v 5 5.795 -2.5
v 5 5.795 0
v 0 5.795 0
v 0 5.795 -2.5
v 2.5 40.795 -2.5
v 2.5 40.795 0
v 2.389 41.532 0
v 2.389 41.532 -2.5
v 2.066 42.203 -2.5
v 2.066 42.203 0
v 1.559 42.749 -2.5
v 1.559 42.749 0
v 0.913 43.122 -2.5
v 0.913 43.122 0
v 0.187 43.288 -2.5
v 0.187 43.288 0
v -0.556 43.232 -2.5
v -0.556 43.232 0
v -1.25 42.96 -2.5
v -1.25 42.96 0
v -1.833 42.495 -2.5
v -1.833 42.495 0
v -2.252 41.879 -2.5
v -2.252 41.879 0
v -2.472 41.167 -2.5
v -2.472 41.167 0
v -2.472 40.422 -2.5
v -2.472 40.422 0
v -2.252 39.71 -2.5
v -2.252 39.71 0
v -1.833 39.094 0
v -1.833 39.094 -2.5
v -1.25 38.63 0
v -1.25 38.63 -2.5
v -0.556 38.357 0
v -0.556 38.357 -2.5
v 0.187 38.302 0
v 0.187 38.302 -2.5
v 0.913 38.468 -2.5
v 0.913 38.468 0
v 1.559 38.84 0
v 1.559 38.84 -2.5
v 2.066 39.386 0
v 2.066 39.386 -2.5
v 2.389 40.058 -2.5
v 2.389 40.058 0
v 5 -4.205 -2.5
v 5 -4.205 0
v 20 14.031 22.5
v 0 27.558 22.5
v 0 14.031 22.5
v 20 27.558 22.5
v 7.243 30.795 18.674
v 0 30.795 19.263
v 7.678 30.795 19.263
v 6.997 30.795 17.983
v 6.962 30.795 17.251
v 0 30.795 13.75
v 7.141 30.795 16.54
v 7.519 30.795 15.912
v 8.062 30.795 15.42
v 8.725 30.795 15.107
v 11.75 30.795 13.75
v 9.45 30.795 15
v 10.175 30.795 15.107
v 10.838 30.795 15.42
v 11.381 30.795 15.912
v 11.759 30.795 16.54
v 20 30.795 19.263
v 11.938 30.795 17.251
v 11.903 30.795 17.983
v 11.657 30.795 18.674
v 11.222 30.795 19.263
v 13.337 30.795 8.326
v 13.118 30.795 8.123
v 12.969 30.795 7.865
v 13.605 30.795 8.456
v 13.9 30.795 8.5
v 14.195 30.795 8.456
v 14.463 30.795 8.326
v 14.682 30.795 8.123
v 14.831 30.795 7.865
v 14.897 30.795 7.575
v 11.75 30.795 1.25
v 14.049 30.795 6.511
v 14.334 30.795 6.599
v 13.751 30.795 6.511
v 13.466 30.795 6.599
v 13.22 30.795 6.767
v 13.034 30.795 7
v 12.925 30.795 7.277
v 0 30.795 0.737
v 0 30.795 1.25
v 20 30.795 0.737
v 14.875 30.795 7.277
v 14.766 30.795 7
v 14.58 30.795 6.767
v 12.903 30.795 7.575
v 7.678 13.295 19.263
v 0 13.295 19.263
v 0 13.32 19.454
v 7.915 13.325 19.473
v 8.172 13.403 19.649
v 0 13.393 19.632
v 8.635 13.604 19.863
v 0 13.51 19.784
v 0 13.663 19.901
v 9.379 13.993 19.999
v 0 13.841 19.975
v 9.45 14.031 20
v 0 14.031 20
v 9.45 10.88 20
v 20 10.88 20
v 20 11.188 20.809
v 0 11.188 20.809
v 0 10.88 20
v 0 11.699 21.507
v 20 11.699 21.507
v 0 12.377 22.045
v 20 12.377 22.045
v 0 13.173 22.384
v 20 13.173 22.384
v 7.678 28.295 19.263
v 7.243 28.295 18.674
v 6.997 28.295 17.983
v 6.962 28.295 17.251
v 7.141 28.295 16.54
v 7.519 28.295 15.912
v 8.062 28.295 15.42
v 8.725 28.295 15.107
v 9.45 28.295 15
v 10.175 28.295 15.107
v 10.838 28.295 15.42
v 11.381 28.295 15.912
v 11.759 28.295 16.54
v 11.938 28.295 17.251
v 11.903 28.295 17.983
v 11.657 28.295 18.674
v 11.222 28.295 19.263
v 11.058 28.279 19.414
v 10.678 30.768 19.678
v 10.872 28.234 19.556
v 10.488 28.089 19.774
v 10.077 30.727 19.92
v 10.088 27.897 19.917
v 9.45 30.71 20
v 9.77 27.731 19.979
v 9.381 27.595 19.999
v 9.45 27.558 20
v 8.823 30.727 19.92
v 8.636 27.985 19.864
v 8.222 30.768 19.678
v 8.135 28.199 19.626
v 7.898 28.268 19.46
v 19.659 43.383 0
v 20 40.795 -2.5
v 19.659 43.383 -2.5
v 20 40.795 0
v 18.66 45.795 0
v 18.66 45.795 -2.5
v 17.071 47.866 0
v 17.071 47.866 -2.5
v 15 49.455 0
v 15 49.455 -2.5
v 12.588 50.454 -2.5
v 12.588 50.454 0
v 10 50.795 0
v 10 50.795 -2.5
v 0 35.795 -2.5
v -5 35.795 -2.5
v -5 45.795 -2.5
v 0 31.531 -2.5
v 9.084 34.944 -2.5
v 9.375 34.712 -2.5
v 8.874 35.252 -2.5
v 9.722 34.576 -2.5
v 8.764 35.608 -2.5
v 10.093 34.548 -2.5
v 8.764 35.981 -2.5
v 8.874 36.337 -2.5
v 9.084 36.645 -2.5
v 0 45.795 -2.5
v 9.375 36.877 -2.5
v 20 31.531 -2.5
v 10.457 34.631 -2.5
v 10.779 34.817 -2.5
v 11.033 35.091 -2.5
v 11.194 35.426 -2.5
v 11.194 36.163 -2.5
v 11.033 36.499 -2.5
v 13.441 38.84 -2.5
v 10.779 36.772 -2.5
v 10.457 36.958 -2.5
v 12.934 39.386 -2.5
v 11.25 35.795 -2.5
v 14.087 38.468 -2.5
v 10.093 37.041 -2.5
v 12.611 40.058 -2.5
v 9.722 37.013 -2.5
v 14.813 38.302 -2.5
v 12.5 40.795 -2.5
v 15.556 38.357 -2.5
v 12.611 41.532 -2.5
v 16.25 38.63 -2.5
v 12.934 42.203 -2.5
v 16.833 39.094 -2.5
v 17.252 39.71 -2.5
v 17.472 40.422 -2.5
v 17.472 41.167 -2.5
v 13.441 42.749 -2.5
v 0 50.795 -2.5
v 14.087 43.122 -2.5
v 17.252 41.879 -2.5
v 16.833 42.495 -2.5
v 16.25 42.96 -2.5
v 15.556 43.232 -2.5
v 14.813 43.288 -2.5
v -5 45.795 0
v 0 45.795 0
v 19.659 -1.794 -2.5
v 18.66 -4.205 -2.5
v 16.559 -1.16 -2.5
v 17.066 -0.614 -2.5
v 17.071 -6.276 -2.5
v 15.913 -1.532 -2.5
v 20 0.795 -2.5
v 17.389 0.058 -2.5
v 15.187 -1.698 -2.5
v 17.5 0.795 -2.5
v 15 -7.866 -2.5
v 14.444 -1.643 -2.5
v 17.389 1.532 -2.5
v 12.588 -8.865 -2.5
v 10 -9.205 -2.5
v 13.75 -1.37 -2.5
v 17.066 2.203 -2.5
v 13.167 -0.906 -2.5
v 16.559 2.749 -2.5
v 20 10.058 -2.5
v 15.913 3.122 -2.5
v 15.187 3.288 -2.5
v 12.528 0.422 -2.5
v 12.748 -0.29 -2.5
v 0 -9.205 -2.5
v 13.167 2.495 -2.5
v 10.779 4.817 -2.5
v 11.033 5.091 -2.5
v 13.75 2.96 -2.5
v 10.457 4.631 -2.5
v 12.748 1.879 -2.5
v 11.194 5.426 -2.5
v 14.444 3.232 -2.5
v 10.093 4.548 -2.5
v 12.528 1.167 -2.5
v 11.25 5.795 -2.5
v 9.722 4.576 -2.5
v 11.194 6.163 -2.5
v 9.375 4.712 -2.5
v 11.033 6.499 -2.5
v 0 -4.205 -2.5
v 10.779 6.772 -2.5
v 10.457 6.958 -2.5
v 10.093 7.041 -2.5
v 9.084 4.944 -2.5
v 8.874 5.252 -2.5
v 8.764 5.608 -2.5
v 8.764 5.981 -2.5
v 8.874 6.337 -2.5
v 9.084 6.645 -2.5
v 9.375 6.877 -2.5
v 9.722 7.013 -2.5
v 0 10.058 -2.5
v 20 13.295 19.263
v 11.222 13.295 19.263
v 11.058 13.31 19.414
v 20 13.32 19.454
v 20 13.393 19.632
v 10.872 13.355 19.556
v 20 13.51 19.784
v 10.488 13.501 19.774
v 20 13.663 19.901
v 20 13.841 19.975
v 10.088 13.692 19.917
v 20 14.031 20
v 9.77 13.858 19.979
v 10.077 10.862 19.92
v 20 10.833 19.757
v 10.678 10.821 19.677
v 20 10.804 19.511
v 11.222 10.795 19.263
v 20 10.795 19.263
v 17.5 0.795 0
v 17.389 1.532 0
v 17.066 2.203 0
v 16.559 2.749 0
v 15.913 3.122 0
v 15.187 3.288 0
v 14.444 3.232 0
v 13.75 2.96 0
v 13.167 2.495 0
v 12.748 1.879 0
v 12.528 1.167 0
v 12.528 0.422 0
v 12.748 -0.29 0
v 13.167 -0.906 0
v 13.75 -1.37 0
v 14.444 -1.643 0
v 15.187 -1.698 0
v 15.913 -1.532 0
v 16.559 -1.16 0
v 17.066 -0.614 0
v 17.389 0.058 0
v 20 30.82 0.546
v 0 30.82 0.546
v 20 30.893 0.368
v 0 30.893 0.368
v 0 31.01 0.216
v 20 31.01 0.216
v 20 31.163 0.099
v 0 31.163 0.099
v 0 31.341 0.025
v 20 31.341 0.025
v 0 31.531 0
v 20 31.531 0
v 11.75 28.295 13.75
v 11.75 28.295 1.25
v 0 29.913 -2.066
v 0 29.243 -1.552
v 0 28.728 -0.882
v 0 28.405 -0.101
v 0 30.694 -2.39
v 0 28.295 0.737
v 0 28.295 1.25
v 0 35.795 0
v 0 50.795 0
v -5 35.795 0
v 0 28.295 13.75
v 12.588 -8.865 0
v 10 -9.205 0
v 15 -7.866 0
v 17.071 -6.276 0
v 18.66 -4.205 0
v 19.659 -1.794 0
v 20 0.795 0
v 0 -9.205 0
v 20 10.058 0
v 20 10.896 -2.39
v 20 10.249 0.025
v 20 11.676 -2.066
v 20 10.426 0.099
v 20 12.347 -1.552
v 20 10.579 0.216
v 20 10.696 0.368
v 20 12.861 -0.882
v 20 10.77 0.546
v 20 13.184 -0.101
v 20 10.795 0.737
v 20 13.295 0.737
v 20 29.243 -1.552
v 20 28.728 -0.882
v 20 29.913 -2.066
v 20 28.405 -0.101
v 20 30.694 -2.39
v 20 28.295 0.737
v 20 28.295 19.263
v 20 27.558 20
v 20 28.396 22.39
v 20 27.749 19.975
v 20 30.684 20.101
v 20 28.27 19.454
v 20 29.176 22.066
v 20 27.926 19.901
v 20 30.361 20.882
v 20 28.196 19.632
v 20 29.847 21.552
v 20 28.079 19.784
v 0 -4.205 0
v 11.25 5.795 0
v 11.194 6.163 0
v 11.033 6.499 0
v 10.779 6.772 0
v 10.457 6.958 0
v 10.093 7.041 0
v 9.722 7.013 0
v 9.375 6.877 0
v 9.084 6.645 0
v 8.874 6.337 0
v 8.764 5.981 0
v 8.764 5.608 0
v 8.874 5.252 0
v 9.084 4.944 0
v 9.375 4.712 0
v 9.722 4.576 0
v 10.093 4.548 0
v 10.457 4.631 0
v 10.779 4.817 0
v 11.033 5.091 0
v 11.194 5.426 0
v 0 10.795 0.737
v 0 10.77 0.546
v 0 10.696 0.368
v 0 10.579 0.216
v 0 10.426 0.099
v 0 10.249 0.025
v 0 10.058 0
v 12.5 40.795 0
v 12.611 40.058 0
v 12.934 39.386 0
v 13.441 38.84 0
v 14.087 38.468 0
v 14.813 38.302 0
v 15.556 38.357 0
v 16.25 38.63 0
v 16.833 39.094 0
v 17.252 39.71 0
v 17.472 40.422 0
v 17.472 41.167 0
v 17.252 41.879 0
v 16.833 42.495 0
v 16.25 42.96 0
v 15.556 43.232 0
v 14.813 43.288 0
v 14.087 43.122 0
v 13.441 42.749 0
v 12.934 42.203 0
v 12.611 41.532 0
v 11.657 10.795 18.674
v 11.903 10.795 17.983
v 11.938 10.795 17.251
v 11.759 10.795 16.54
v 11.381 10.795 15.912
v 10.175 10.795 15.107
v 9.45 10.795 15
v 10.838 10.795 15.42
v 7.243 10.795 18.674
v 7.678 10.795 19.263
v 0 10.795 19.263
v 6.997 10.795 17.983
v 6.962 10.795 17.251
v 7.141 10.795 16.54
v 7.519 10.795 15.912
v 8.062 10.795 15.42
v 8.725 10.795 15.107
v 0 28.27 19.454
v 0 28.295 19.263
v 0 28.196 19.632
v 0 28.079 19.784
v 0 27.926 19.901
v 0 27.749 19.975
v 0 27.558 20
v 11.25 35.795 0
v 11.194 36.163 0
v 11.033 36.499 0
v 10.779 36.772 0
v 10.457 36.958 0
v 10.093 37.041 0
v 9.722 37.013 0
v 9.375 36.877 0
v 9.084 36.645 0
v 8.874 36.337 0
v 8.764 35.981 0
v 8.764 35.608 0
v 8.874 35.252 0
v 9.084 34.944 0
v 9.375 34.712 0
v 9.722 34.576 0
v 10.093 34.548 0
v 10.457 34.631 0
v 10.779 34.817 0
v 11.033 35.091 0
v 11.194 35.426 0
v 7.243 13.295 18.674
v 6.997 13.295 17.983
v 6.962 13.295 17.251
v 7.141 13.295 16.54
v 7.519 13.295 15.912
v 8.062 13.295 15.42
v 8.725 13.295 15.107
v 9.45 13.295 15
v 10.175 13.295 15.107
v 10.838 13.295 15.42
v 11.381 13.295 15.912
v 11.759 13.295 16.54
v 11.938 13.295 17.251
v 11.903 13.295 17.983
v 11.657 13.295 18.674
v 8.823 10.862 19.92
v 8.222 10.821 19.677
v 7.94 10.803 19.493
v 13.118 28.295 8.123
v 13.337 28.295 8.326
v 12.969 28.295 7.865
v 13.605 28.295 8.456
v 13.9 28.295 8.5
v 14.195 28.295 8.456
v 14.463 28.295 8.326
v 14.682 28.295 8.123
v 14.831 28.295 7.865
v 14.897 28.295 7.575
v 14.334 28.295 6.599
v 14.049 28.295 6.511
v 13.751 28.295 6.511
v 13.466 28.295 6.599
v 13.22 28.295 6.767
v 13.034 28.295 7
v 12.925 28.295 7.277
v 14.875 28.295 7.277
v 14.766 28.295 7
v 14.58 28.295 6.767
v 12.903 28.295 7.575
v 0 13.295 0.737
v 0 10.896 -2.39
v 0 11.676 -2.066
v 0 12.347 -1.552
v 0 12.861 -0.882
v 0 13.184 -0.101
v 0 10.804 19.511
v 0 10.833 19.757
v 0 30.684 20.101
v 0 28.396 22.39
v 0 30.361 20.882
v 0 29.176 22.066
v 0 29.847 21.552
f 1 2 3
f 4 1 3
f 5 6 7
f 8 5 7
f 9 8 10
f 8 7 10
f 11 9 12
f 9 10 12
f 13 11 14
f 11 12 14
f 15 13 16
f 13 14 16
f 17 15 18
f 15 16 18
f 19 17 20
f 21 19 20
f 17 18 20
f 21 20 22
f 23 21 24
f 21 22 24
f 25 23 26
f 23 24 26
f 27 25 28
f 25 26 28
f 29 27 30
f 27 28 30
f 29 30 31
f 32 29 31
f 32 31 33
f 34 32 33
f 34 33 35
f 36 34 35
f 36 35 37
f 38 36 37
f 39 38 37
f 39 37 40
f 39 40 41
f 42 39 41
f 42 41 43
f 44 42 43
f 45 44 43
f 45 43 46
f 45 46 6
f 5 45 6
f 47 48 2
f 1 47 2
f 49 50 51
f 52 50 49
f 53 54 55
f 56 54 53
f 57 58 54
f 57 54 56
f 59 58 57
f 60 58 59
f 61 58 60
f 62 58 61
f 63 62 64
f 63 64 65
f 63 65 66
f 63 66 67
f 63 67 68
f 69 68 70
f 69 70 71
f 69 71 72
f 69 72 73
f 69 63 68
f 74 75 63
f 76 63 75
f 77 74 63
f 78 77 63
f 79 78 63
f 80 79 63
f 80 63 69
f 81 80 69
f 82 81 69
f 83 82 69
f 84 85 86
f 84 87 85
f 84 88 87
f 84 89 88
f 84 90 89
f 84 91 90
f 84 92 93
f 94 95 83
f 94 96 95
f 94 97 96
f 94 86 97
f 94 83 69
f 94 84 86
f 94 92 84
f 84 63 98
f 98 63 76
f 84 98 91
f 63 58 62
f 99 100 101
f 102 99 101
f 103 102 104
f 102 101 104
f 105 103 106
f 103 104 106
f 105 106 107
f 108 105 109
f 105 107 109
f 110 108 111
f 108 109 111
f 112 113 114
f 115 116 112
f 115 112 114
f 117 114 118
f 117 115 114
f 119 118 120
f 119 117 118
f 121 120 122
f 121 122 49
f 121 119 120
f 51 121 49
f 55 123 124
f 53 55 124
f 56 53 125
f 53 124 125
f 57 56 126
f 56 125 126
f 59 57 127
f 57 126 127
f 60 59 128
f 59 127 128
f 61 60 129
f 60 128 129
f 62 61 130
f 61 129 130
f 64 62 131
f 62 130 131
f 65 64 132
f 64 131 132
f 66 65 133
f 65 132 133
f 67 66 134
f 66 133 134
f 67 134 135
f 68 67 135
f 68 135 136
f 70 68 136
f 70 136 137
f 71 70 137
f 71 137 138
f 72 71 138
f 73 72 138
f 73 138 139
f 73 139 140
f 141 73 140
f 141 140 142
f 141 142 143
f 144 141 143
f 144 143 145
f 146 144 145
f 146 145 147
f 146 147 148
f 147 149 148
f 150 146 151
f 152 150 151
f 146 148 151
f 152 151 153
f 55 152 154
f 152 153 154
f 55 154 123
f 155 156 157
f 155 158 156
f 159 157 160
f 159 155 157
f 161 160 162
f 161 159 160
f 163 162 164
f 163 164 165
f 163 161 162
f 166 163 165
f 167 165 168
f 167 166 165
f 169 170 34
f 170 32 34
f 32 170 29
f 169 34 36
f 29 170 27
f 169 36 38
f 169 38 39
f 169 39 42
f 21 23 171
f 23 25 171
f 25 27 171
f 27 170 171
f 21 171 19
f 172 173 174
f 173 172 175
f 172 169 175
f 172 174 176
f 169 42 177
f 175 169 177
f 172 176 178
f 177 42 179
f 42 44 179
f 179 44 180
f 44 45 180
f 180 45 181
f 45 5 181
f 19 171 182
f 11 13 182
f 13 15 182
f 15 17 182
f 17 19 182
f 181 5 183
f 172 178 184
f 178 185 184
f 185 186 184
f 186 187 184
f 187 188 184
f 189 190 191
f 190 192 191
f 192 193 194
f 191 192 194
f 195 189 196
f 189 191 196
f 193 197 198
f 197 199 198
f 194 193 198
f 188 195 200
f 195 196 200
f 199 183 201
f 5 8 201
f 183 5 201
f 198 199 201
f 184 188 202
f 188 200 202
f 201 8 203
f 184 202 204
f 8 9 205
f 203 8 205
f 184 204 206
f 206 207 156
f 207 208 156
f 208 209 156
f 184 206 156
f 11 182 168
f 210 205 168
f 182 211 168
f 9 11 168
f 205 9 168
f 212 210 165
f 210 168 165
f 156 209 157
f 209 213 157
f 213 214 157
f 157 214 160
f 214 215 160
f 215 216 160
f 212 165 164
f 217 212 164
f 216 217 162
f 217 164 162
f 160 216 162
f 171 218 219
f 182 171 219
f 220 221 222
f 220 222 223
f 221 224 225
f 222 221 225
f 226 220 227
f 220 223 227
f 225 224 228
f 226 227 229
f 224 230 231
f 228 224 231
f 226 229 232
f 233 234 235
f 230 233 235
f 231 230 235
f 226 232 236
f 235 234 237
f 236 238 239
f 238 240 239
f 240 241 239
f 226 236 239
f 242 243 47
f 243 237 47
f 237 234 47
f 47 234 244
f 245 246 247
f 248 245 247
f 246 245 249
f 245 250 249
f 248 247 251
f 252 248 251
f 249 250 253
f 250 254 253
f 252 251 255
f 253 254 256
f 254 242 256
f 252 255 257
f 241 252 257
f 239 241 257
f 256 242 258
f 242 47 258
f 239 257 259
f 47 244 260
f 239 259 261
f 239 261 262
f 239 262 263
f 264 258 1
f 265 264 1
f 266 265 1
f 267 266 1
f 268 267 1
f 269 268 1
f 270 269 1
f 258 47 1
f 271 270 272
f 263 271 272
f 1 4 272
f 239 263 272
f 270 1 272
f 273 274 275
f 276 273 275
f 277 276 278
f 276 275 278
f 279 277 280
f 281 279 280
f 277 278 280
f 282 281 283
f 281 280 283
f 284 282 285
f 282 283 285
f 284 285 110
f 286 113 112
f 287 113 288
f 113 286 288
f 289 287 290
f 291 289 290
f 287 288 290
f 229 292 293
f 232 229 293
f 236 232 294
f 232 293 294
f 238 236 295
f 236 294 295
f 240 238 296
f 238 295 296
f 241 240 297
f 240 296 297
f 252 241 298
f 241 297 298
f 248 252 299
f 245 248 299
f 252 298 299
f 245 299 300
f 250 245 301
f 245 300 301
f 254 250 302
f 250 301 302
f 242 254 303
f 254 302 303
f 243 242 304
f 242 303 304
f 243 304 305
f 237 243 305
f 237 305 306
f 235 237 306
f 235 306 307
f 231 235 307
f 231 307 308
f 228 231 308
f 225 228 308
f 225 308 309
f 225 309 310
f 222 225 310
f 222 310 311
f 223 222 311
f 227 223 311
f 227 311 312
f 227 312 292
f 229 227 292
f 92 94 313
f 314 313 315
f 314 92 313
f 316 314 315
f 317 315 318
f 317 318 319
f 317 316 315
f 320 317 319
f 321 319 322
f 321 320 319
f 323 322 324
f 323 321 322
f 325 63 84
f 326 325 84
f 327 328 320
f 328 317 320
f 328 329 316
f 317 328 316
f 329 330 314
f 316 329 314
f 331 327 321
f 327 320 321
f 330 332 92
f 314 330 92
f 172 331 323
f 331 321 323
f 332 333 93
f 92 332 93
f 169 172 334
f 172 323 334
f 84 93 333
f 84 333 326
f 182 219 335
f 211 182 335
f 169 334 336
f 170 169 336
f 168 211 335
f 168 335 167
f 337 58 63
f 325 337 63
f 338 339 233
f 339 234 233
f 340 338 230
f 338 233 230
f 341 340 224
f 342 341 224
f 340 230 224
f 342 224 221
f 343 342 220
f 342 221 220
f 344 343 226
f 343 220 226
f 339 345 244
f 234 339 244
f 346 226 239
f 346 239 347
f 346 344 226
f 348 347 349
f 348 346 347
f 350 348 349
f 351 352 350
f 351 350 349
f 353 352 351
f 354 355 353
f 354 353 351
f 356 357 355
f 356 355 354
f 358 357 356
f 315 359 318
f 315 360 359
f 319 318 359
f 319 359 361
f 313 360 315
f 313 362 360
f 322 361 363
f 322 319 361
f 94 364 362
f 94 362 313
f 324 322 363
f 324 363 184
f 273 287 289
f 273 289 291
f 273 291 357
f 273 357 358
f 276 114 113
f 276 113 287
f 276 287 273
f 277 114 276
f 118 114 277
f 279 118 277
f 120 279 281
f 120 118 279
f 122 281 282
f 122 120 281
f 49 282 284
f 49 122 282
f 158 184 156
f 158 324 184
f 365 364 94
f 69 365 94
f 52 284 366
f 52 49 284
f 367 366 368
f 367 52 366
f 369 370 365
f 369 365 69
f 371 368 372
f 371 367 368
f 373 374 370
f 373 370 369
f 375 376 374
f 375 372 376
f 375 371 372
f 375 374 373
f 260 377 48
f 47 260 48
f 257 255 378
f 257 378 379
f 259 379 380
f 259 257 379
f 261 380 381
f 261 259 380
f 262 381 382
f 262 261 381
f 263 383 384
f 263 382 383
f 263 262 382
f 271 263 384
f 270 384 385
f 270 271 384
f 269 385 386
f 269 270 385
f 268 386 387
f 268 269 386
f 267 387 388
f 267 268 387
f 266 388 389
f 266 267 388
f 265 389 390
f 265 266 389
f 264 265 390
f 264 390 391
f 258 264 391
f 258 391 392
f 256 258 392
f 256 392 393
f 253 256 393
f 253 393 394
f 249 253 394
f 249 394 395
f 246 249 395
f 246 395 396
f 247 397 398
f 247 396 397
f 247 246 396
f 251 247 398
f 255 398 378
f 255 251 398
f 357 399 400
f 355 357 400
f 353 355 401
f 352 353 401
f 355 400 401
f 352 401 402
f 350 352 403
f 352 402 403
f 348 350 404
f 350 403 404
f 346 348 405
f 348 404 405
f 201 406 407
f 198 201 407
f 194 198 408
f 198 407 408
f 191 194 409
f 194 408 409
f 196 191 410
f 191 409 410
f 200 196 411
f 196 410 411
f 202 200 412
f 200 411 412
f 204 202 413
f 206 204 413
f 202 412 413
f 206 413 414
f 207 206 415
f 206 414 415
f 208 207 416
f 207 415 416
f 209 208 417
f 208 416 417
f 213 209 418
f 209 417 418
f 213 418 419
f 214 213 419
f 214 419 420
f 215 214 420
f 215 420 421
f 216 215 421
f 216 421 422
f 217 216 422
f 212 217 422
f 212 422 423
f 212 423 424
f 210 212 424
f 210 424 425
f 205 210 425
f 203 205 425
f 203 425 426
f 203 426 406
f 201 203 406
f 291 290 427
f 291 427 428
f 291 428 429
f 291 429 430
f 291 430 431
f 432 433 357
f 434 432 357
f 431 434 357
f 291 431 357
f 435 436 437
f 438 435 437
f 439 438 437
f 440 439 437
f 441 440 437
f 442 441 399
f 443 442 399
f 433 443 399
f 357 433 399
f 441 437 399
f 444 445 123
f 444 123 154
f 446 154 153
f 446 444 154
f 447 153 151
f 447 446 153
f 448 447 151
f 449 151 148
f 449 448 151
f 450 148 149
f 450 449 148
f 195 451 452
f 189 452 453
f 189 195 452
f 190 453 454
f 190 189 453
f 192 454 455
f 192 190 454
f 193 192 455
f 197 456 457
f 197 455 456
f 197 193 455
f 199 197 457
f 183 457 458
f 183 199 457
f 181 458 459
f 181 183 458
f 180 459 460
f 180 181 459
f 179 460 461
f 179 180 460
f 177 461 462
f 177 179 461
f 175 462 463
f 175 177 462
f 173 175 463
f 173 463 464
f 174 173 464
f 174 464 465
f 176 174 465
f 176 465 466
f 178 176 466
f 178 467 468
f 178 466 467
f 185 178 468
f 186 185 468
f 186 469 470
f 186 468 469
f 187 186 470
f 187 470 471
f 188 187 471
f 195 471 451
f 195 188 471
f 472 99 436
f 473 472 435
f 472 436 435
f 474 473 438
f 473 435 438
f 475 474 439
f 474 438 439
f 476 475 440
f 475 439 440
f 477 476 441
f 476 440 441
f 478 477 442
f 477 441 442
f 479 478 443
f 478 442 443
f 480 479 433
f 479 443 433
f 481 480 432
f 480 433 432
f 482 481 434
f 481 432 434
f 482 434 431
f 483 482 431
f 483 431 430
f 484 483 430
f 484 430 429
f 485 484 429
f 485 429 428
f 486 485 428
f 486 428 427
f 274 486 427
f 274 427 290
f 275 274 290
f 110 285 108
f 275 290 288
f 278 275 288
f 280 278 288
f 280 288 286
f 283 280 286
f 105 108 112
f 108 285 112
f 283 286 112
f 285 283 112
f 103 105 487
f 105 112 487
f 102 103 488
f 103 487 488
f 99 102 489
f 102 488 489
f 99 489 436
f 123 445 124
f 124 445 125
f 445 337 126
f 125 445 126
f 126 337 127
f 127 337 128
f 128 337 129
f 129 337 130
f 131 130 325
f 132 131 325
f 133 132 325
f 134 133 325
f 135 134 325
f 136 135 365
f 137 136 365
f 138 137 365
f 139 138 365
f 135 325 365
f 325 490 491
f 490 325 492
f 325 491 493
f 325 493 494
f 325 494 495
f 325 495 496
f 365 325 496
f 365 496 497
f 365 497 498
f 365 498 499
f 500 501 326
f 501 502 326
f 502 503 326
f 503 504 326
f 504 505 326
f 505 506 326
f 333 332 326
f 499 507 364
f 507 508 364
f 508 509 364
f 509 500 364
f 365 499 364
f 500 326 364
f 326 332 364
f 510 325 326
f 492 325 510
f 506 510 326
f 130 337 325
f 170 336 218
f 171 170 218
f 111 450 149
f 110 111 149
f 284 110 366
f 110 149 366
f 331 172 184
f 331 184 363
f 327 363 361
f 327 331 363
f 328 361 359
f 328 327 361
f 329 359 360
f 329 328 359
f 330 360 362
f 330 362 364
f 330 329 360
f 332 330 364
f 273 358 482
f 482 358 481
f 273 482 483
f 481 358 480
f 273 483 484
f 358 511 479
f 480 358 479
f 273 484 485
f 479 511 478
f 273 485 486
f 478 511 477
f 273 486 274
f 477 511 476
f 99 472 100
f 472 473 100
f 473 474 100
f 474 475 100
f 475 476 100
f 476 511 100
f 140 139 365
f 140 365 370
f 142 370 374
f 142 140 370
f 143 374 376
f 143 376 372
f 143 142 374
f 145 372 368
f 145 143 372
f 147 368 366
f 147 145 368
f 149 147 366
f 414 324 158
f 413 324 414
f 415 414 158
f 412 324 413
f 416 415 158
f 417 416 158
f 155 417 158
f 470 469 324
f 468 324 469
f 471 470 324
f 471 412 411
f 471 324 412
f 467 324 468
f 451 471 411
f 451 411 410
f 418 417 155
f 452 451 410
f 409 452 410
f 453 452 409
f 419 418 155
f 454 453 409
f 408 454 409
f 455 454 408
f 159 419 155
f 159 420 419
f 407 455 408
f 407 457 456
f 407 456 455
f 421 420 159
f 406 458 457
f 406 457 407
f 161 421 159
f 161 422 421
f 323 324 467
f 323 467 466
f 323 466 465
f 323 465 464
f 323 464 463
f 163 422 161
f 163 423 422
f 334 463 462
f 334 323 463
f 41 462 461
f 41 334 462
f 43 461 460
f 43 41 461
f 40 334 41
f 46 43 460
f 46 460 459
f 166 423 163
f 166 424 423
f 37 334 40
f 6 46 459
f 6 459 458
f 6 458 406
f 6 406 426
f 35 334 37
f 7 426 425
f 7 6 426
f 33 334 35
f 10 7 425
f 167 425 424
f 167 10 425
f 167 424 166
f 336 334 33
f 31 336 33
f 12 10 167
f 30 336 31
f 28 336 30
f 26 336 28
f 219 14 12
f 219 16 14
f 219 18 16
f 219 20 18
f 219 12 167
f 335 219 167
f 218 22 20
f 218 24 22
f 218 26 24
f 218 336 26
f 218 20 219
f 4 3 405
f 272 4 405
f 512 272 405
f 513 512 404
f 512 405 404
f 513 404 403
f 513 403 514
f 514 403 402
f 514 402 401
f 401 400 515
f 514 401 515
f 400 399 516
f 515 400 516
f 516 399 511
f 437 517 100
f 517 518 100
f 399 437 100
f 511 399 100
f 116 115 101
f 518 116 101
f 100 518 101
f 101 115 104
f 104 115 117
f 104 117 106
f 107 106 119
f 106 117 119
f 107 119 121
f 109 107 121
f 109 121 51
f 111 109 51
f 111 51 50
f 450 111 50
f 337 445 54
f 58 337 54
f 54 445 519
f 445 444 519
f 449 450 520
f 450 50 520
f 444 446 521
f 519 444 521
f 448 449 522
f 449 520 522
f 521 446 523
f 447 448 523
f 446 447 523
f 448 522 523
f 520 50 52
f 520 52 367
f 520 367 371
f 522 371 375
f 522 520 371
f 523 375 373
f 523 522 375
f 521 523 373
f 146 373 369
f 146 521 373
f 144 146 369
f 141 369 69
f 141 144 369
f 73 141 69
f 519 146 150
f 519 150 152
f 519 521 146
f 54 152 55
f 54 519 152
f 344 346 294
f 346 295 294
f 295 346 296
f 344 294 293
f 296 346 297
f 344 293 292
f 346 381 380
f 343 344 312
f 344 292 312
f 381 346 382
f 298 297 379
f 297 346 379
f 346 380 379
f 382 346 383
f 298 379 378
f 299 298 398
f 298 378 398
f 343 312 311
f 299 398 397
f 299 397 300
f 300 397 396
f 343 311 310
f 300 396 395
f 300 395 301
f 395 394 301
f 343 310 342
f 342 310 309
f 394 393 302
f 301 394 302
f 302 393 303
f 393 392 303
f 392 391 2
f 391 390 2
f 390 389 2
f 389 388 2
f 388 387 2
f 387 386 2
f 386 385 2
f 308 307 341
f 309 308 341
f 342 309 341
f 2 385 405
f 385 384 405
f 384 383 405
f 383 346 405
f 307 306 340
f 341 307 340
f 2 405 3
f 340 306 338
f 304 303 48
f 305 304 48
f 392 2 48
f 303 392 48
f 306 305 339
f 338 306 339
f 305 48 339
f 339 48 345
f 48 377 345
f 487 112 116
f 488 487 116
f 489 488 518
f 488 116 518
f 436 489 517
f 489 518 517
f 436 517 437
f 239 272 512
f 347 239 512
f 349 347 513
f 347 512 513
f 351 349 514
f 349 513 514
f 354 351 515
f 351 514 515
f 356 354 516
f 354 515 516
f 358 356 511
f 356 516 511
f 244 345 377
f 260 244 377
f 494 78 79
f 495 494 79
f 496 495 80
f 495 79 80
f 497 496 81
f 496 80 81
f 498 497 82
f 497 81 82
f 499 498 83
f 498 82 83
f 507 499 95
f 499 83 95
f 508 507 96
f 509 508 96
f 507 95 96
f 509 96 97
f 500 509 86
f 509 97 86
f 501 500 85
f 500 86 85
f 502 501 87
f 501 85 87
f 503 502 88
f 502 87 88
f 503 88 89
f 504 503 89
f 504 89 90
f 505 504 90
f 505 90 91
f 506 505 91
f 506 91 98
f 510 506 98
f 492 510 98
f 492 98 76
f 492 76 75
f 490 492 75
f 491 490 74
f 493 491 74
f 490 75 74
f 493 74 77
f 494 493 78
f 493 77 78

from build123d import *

# Parameters (mm, degrees)
SKETCH1_W           = 40
SKETCH1_H           = 60
SKETCH1_R           = 1.25
BASE_FLANGE1_DEPTH  = 2.5
SKETCH15_R          = 1
CUT_EXTRUDE3_DEPTH  = 10
JOG3_START          = -2.5
JOG3_OUTLINE_W      = 40
JOG3_OUTLINE_H      = 58.294687966
JOG3_OUTLINE_R      = 1
JOG3_OUTLINE_R_2    = 1.25
JOG3_DEPTH          = 2.5
JOG3_2_OUTLINE_W    = 40
JOG3_2_OUTLINE_H    = 1.705312034
JOG3_2_DEPTH        = 0.332528284
JOG3_START_2        = 19.2634
JOG3_3_OUTLINE_W    = 40
JOG3_3_OUTLINE_H    = 40
JOG3_3_OUTLINE_R    = 1
JOG3_3_OUTLINE_R_2  = 1.25
JOG3_3_DEPTH        = 3.2366
JOG3_4_OUTLINE_W    = 40
JOG3_4_OUTLINE_H    = 20.794687966
JOG3_4_OUTLINE_R    = 1.25
JOG3_4_DEPTH        = 3.2366
JOG3_5_OUTLINE_W    = 40
JOG3_5_OUTLINE_H    = 2.5
JOG3_5_DEPTH        = 20
JOG3_START_3        = 20
JOG3_6_OUTLINE_R    = 1.25
JOG3_6_OUTLINE_R_2  = 1
JOG3_6_DEPTH        = 2.5
JOG3_START_4        = -20
JOG3_7_DEPTH        = 40
JOG4_START          = -20
JOG4_DEPTH          = 40
JOG4_2_DEPTH        = 40
JOG4_START_2        = -3
JOG4_3_OUTLINE_R    = 1.25
JOG4_3_DEPTH        = 4
FILLET1_R           = 10
SKETCH18_R          = 2.5
BOSS_EXTRUDE1_DEPTH = 2.5
SKETCH19_R          = 1
SKETCH19_W          = 23.5
SKETCH19_H          = 12.5
CUT_EXTRUDE4_DEPTH  = 2.5
SKETCH20_R          = 2.5
CUT_EXTRUDE6_DEPTH  = 10
SKETCH23_R          = 2.5
CUT_EXTRUDE7_DEPTH  = 51.062460986
SKETCH24_R          = 5
CUT_EXTRUDE8_DEPTH  = 1.25
SKETCH26_R          = 2.5
CUT_EXTRUDE12_DEPTH = 51.062460987
SKETCH27_W          = 20
SKETCH27_H          = 13.5268
CUT_EXTRUDE13_DEPTH = 61.042487703


with BuildPart() as part:
    # Base-Flange1: sheet metal written as solids
    # Sketch1 → Base-Flange1 (new body)
    with BuildSketch(Plane.XY):
        Rectangle(SKETCH1_W, SKETCH1_H)
        with Locations((10, 15)):
            Circle(SKETCH1_R, mode=Mode.SUBTRACT)
        with Locations(Location((10, -15, 0), (0, 0, 180))):
            Circle(SKETCH1_R, mode=Mode.SUBTRACT)
        with Locations((-10, -15)):
            Circle(SKETCH1_R, mode=Mode.SUBTRACT)
        with Locations(Location((-10, 15, 0), (0, 0, 180))):
            Circle(SKETCH1_R, mode=Mode.SUBTRACT)
    extrude(amount=-BASE_FLANGE1_DEPTH)

    # Sketch15 → Cut-Extrude3 (cut)
    with BuildSketch(Plane.XY):
        with Locations((12, 0)):
            Circle(SKETCH15_R)
        with Locations(Location((-17, 0, 0), (0, 0, 180))):
            Circle(SKETCH15_R)
    extrude(amount=-CUT_EXTRUDE3_DEPTH, mode=Mode.SUBTRACT)

    # Jog3: read off the stored shape, not the designer's step
    # Jog3 outline → Jog3 (cut)
    with BuildSketch(Plane.XY.offset(JOG3_START)):
        with Locations((0, -0.852656017)):
            Rectangle(JOG3_OUTLINE_W, JOG3_OUTLINE_H)
        with Locations((-17, 0)):
            Circle(JOG3_OUTLINE_R, mode=Mode.SUBTRACT)
        with Locations((12, 0)):
            Circle(JOG3_OUTLINE_R, mode=Mode.SUBTRACT)
        with Locations((-10, 15)):
            Circle(JOG3_OUTLINE_R_2, mode=Mode.SUBTRACT)
        with Locations((10, 15)):
            Circle(JOG3_OUTLINE_R_2, mode=Mode.SUBTRACT)
        with Locations((10, -15)):
            Circle(JOG3_OUTLINE_R_2, mode=Mode.SUBTRACT)
        with Locations((-10, -15)):
            Circle(JOG3_OUTLINE_R_2, mode=Mode.SUBTRACT)
    extrude(amount=JOG3_DEPTH, mode=Mode.SUBTRACT)

    # Jog3 2 outline → Jog3 2 (cut)
    with BuildSketch(Plane.XY.offset(JOG3_START)):
        with Locations((0, 29.147343983)):
            Rectangle(JOG3_2_OUTLINE_W, JOG3_2_OUTLINE_H)
    extrude(amount=JOG3_2_DEPTH, mode=Mode.SUBTRACT)

    # Jog3 4 outline → Jog3 4 (add)
    with BuildSketch(Plane.XY.offset(JOG3_START)):
        with Locations((0, 40.397343983)):
            Rectangle(JOG3_4_OUTLINE_W, JOG3_4_OUTLINE_H)
        with Locations((10, 35.794687966)):
            Circle(JOG3_4_OUTLINE_R, mode=Mode.SUBTRACT)
        with Locations((-10, 35.794687966)):
            Circle(JOG3_4_OUTLINE_R, mode=Mode.SUBTRACT)
    extrude(amount=JOG3_4_DEPTH)



with BuildPart() as body_2:
    # Jog3 3 outline → Jog3 3 (new body)
    with BuildSketch(Plane.XY.offset(JOG3_START_2)):
        with Locations((0, 10.794687966)):
            Rectangle(JOG3_3_OUTLINE_W, JOG3_3_OUTLINE_H)
        with Locations((12, 20.794687966)):
            Circle(JOG3_3_OUTLINE_R, mode=Mode.SUBTRACT)
        with Locations((-17, 0)):
            Circle(JOG3_3_OUTLINE_R, mode=Mode.SUBTRACT)
        with Locations((-10, 5.794687966)):
            Circle(JOG3_3_OUTLINE_R_2, mode=Mode.SUBTRACT)
        with Locations((12, 0)):
            Circle(JOG3_3_OUTLINE_R, mode=Mode.SUBTRACT)
        with Locations((10, 5.794687966)):
            Circle(JOG3_3_OUTLINE_R_2, mode=Mode.SUBTRACT)
        with Locations((-17, 20.794687966)):
            Circle(JOG3_3_OUTLINE_R, mode=Mode.SUBTRACT)
        with Locations((-10, 15)):
            Circle(JOG3_3_OUTLINE_R_2, mode=Mode.SUBTRACT)
        with Locations((10, 15)):
            Circle(JOG3_3_OUTLINE_R_2, mode=Mode.SUBTRACT)
    extrude(amount=JOG3_3_DEPTH)


with BuildPart() as part_1:
    add(part.part)

    add(body_2.part)  # Jog3 5 merges body 2
    # Jog3 5 outline → Jog3 5 (add)
    with BuildSketch(Plane.XY):
        with Locations((0, 29.544687966)):
            Rectangle(JOG3_5_OUTLINE_W, JOG3_5_OUTLINE_H)
    extrude(amount=JOG3_5_DEPTH)

    # Jog3 6 outline → Jog3 6 (add)
    with BuildSketch(Plane.XY.offset(JOG3_START_3)):
        with Locations((10, 15)):
            Circle(JOG3_6_OUTLINE_R)
        with Locations((-10, 15)):
            Circle(JOG3_6_OUTLINE_R)
        with Locations((12, 0)):
            Circle(JOG3_6_OUTLINE_R_2)
        with Locations((-17, 0)):
            Circle(JOG3_6_OUTLINE_R_2)
    extrude(amount=JOG3_6_DEPTH)

    # Jog3 7 outline → Jog3 7 (cut)
    with BuildSketch(Plane.YZ.offset(JOG3_START_4)):
        with BuildLine():
            ThreePointArc((28.294687966, 19.2634), (28.078942821, 19.784254855), (27.558087966, 20))
            Line((27.558087966, 20), (-9.205312034, 20))
            Line((-9.205312034, 20), (-9.205312034, 19.2634))
            Line((-9.205312034, 19.2634), (28.294687966, 19.2634))
        make_face()
        with BuildLine():
            ThreePointArc((31.531287966, -2.5), (29.242666158, -1.552021808), (28.294687966, 0.7366))
            Line((28.294687966, 0.7366), (28.294687966, -2.167471716))
            Line((28.294687966, -2.167471716), (30, -2.167471716))
            Line((30, -2.167471716), (30, -2.5))
            Line((30, -2.5), (31.531287966, -2.5))
        make_face()
        with BuildLine():
            Line((31.531287966, 0), (50.794687966, 0))
            Line((50.794687966, 0), (50.794687966, 0.7366))
            Line((50.794687966, 0.7366), (30.794687966, 0.7366))
            ThreePointArc((30.794687966, 0.7366), (31.010433111, 0.215745145), (31.531287966, 0))
        make_face()
        with BuildLine():
            Line((30.794687966, 22.5), (27.558087966, 22.5))
            ThreePointArc((27.558087966, 22.5), (29.846709774, 21.552021808), (30.794687966, 19.2634))
            Line((30.794687966, 19.2634), (30.794687966, 22.5))
        make_face()
    extrude(amount=JOG3_7_DEPTH, mode=Mode.SUBTRACT)

    # Jog4: read off the stored shape, not the designer's step
    # Jog4 outline → Jog4 (cut)
    with BuildSketch(Plane.YZ.offset(JOG4_START)):
        with BuildLine():
            Line((-9.205312034, 20), (10.87962174, 20))
            ThreePointArc((10.87962174, 20), (12.019882984, 21.799110859), (14.031287966, 22.5))
            Line((14.031287966, 22.5), (-9.205312034, 22.5))
            Line((-9.205312034, 22.5), (-9.205312034, 20))
        make_face()
    extrude(amount=JOG4_DEPTH, mode=Mode.SUBTRACT)

    # Jog4 2 outline → Jog4 2 (add)
    with BuildSketch(Plane.YZ.offset(JOG4_START)):
        with BuildLine():
            Line((-9.205312034, 0), (-9.205312034, -2.5))
            Line((-9.205312034, -2.5), (10.058087966, -2.5))
            ThreePointArc((10.058087966, -2.5), (12.346709774, -1.552021808), (13.294687966, 0.7366))
            Line((13.294687966, 0.7366), (13.294687966, 19.2634))
            ThreePointArc((13.294687966, 19.2634), (13.510433111, 19.784254855), (14.031287966, 20))
            Line((14.031287966, 20), (10.87962174, 20))
            ThreePointArc((10.87962174, 20), (10.81599152, 19.634140241), (10.794687966, 19.2634))
            Line((10.794687966, 19.2634), (10.794687966, 0.7366))
            ThreePointArc((10.794687966, 0.7366), (10.578942821, 0.215745145), (10.058087966, 0))
            Line((10.058087966, 0), (-9.205312034, 0))
        make_face()
    extrude(amount=JOG4_2_DEPTH)

    # Jog4 3 outline → Jog4 3 (cut)
    with BuildSketch(Plane.XY.offset(JOG4_START_2)):
        with Locations((-10, 5.794687966)):
            Circle(JOG4_3_OUTLINE_R)
        with Locations((10, 5.794687966)):
            Circle(JOG4_3_OUTLINE_R)
    extrude(amount=JOG4_3_DEPTH, mode=Mode.SUBTRACT)

    # Fillet1
    fillet1_edges = [part_1.edges().sort_by_distance(p)[0] for p in [
        (20, -9.205312034, -1.25),
        (-20, -9.205312034, -1.25),
        (-20, 50.794687966, -1.25),
        (20, 50.794687966, -1.25),
    ]]
    fillet(fillet1_edges, radius=FILLET1_R)

    # Sketch18 → Boss-Extrude1 (add)
    with BuildSketch(Plane.XY.offset(22.5)):
        with Locations((12, 20.794687966)):
            Circle(SKETCH18_R)
        with Locations((-17, 20.794687966)):
            Circle(SKETCH18_R)
    extrude(amount=-BOSS_EXTRUDE1_DEPTH)

    # Sketch19 → Cut-Extrude4 (cut)
    with BuildSketch(Plane(origin=(0, 30.794687966, 0), x_dir=(1, 0, 0), z_dir=(0, 1, 0))):
        with Locations(Location((13.9, -7.5, 0), (0, 0, 270))):
            Circle(SKETCH19_R)
        with Locations(Location((-13.9, -7.5, 0), (0, 0, 90))):
            Circle(SKETCH19_R)
        with Locations((0, -7.5)):
            Rectangle(SKETCH19_W, SKETCH19_H)
    extrude(amount=-CUT_EXTRUDE4_DEPTH, mode=Mode.SUBTRACT)

    # Sketch20 → Cut-Extrude6 (cut)
    with BuildSketch(Plane.XY):
        with Locations((0, 40.794687966)):
            Circle(SKETCH20_R)
        with Locations(Location((0, 0.794687966, 0), (0, 0, 180))):
            Circle(SKETCH20_R)
        with Locations((15, 0.794687966)):
            Circle(SKETCH20_R)
        with Locations(Location((-15, 0.794687966, 0), (0, 0, 180))):
            Circle(SKETCH20_R)
        with Locations(Location((15, 40.794687966, 0), (0, 0, 180))):
            Circle(SKETCH20_R)
        with Locations((-15, 40.794687966)):
            Circle(SKETCH20_R)
    extrude(amount=-CUT_EXTRUDE6_DEPTH, mode=Mode.SUBTRACT)

    # Sketch23 → Cut-Extrude7 (cut, through all)
    with BuildSketch(Plane(origin=(0, 30.794687966, 0), x_dir=(1, 0, 0), z_dir=(0, 1, 0))):
        with Locations(Location((-5.55, -7.5, 0), (0, 0, 270))):
            Circle(SKETCH23_R)
    extrude(amount=-CUT_EXTRUDE7_DEPTH, mode=Mode.SUBTRACT)

    # Sketch24 → Cut-Extrude8 (cut)
    with BuildSketch(Plane(origin=(0, 13.294687966, 0), x_dir=(1, 0, 0), z_dir=(0, 1, 0))):
        with Locations(Location((-5.55, -7.5, 0), (0, 0, 270))):
            Circle(SKETCH24_R)
    extrude(amount=-CUT_EXTRUDE8_DEPTH, mode=Mode.SUBTRACT)

    # Sketch26 → Cut-Extrude12 (cut, through all)
    with BuildSketch(Plane.XZ.offset(-10.794687966)):
        with Locations(Location((9.45, 17.5, 0), (0, 0, 135.141364755))):
            Circle(SKETCH26_R)
    extrude(amount=-CUT_EXTRUDE12_DEPTH, mode=Mode.SUBTRACT)

    # Sketch27 → Cut-Extrude13 (cut, through all)
    with BuildSketch(Plane.XY.offset(22.5)):
        with Locations((-10, 20.794687966)):
            Rectangle(SKETCH27_W, SKETCH27_H)
        Polygon((0, 45.794687966), (0, 50.794687966), (-20, 50.794687966), (-20, 27.558087966), (0, 27.558087966), (0, 35.794687966), (-5, 35.794687966), (-5, 45.794687966), align=None)
        Polygon((0, 14.031287966), (-20, 14.031287966), (-20, -9.205312034), (0, -9.205312034), (0, -4.205312034), (5, -4.205312034), (5, 5.794687966), (0, 5.794687966), align=None)
    extrude(amount=-CUT_EXTRUDE13_DEPTH, mode=Mode.SUBTRACT)


solid = part_1.part
